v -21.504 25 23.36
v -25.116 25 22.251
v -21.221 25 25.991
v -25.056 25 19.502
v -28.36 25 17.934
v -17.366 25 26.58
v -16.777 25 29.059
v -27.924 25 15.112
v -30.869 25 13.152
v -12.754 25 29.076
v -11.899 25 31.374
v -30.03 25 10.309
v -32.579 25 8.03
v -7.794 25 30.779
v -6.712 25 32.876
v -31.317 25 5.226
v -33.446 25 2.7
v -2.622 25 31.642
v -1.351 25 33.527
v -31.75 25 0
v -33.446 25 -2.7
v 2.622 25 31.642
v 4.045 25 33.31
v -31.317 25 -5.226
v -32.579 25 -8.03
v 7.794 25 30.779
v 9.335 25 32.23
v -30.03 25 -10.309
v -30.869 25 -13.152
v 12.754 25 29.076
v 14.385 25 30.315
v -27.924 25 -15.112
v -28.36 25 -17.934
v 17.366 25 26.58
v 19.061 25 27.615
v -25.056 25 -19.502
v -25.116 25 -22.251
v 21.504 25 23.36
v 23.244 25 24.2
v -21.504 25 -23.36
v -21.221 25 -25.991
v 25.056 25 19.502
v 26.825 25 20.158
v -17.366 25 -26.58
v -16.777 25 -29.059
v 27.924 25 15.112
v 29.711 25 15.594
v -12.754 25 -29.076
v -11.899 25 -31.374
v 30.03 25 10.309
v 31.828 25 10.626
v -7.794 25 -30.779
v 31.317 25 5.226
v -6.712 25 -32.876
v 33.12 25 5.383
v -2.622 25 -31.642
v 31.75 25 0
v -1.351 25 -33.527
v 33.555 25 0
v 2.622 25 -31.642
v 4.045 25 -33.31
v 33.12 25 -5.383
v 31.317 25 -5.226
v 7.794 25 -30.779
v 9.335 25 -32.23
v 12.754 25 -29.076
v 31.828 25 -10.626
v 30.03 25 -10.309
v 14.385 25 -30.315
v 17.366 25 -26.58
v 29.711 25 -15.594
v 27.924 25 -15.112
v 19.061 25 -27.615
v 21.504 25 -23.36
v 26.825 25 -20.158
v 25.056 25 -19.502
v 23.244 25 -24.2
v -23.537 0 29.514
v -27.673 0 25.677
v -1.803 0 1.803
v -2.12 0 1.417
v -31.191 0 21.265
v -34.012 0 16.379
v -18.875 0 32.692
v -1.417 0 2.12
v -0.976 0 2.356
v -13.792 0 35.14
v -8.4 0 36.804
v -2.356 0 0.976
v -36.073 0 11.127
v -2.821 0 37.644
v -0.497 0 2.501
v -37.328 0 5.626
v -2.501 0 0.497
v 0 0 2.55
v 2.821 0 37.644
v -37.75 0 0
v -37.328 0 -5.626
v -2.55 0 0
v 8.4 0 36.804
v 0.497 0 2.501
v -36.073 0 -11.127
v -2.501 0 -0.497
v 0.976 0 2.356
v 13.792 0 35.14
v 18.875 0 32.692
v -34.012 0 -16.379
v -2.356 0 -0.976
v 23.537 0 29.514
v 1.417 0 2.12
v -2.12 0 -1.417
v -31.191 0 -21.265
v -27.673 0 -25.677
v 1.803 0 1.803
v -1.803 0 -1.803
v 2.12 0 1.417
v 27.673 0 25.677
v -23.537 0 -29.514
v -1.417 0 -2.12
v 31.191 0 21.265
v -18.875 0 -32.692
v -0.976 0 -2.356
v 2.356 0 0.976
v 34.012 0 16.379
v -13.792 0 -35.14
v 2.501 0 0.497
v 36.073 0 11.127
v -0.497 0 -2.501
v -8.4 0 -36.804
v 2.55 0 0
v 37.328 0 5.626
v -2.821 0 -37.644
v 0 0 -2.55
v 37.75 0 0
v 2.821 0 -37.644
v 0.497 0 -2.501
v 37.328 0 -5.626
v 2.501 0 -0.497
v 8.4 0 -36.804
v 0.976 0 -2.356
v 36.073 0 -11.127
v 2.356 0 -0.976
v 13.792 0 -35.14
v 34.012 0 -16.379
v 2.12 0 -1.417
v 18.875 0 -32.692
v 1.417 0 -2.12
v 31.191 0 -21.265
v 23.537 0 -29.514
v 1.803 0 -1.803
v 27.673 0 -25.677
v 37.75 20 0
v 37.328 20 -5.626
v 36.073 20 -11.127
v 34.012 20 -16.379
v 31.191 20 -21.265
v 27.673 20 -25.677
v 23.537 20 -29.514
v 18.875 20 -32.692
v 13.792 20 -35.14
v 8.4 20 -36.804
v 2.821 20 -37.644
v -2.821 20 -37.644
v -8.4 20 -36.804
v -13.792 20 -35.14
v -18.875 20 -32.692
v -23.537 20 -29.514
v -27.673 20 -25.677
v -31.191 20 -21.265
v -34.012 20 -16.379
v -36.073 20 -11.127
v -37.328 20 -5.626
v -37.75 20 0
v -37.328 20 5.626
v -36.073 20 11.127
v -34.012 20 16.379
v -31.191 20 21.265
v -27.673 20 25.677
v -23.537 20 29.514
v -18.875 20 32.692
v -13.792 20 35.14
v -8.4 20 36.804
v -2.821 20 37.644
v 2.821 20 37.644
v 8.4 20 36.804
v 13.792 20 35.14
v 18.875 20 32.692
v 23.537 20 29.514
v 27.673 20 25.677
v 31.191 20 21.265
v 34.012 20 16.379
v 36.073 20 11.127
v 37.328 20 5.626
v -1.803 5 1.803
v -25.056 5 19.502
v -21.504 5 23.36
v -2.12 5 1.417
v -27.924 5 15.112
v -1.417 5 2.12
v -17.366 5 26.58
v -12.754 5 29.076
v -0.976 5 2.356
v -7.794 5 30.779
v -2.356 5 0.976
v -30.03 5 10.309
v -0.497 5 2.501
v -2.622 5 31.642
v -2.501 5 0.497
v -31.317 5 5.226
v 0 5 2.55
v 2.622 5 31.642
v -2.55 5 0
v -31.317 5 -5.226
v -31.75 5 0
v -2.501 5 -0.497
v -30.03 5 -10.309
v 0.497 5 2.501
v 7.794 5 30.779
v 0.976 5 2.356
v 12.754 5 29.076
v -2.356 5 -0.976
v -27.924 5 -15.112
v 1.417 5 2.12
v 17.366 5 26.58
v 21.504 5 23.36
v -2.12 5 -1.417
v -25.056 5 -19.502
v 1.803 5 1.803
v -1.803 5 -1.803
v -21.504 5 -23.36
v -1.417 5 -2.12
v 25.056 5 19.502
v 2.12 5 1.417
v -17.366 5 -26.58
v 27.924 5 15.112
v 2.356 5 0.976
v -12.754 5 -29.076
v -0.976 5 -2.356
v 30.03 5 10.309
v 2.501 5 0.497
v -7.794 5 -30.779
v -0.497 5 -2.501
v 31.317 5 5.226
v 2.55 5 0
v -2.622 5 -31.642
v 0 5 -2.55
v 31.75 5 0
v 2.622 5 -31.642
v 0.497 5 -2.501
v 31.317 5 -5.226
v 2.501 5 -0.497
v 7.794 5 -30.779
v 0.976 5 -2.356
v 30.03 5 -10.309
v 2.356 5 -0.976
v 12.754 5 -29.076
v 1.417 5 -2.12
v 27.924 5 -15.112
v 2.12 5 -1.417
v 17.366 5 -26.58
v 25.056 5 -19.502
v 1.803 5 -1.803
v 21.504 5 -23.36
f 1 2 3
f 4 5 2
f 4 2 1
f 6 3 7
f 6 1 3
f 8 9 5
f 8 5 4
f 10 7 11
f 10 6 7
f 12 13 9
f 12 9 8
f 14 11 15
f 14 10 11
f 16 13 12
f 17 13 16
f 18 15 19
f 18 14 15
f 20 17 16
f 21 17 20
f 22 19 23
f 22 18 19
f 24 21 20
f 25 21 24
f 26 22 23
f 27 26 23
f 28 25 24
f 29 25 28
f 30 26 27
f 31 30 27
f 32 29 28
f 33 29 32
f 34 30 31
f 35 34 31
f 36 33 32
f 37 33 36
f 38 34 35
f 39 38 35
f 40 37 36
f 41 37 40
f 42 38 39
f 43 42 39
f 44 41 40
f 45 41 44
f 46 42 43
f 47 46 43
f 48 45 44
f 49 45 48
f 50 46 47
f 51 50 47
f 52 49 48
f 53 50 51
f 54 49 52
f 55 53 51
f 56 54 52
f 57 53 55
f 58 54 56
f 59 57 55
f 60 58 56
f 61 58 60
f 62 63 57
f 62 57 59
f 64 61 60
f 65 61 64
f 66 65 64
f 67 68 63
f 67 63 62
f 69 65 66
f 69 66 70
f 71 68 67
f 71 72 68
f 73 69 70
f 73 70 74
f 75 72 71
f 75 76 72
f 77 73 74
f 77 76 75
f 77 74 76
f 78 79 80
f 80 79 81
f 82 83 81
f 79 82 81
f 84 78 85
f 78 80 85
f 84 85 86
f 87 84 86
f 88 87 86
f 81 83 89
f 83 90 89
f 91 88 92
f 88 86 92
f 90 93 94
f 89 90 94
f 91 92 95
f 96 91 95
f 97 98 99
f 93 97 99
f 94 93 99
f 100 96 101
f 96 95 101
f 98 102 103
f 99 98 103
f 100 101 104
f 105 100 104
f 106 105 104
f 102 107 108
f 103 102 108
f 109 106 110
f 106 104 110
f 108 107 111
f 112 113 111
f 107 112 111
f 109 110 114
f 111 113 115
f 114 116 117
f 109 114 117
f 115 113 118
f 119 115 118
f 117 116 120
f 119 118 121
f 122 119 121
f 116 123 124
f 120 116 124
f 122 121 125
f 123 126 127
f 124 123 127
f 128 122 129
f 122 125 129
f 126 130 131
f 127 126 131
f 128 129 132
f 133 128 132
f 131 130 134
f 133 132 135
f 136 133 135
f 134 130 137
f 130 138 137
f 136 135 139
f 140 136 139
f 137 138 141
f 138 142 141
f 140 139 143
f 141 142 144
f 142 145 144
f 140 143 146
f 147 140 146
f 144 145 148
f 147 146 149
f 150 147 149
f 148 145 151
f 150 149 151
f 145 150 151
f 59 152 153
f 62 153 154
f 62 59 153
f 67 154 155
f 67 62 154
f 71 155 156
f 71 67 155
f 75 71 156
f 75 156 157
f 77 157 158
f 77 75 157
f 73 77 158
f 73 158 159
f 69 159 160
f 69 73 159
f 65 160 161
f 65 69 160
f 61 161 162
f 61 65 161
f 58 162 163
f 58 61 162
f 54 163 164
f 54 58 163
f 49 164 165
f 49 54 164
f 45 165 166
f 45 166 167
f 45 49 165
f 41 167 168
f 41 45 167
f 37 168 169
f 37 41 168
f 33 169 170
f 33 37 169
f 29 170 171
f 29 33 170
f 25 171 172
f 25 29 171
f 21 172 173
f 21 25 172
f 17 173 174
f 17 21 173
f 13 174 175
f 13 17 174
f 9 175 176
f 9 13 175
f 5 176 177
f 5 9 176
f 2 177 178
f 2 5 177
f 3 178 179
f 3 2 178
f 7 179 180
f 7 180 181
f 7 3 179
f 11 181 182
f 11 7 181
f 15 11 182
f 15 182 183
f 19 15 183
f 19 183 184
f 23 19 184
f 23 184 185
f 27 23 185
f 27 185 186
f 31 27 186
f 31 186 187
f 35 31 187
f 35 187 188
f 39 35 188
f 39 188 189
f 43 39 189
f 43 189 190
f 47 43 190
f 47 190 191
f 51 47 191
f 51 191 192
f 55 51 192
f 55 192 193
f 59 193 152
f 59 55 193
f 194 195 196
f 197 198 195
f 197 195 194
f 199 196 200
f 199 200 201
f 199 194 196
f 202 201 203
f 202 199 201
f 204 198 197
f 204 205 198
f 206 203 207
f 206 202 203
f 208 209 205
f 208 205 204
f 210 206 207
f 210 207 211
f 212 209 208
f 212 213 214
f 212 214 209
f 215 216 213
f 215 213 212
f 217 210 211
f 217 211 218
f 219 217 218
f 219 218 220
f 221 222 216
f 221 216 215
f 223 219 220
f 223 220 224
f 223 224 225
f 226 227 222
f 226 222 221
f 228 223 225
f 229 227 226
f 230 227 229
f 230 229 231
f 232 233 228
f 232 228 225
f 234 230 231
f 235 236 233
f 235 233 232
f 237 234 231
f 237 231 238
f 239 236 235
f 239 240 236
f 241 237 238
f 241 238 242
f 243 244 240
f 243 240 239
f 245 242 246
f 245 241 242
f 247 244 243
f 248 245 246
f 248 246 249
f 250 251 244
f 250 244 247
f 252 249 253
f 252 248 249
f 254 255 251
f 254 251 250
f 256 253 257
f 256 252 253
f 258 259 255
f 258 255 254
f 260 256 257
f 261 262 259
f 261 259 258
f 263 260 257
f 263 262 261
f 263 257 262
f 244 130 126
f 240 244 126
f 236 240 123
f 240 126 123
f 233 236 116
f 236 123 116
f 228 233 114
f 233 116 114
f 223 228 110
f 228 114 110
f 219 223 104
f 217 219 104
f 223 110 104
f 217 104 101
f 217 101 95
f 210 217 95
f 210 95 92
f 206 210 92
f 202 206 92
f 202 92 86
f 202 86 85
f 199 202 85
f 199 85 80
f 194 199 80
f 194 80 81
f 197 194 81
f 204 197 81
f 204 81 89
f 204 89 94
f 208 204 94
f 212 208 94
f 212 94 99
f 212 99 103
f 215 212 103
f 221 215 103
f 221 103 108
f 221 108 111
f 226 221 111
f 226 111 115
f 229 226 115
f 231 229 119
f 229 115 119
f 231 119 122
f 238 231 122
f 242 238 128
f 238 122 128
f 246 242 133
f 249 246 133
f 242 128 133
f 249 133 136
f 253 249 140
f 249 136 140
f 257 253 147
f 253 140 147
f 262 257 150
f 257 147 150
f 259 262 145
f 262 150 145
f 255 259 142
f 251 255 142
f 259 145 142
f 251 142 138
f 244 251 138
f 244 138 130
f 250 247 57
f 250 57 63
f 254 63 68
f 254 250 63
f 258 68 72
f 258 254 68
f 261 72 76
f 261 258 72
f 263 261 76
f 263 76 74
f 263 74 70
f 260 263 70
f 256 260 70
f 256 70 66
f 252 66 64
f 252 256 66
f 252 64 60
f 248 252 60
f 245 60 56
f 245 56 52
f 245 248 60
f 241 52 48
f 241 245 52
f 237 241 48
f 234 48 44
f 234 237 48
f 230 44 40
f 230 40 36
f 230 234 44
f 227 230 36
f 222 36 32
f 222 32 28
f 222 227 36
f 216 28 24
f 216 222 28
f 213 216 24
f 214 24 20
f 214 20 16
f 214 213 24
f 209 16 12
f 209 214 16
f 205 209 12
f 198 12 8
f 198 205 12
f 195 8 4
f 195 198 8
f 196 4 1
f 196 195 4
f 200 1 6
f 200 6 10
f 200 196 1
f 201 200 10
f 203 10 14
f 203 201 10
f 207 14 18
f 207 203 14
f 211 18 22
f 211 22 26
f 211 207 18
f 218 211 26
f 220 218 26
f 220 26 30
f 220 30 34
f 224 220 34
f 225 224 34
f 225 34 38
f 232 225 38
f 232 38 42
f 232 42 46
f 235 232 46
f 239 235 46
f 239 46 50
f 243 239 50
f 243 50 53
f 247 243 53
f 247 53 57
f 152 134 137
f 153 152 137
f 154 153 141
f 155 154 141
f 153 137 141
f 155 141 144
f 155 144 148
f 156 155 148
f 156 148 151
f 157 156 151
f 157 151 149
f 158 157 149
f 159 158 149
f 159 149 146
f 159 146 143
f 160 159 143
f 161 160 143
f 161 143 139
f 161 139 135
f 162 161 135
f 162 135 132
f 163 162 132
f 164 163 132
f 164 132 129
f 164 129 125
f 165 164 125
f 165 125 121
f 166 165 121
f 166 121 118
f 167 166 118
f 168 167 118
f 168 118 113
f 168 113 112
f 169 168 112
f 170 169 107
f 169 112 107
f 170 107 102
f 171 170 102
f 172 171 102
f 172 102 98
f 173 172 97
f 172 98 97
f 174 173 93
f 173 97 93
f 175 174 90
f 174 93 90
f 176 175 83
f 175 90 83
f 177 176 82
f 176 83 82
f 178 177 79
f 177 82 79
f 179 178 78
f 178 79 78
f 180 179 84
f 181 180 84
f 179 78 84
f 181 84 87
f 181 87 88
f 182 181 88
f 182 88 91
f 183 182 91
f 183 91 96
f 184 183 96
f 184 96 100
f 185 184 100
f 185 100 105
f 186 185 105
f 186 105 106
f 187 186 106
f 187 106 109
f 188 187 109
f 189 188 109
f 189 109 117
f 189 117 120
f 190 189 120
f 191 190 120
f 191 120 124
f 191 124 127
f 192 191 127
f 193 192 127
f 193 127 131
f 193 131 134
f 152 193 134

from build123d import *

# Parameters (mm, degrees)
SKETCH1_R               = 37.75
BOSS_EXTRUDE1_DEPTH     = 5
SKETCH2_R               = 37.75
SKETCH2_R_2             = 31.7505
BOSS_EXTRUDE2_DEPTH     = 20
CHAMFER1_SIZE           = 5
CHAMFER1_SIZE2          = 4.195498156
SKETCH3_R               = 2.55
CUT_EXTRUDE1_DEPTH      = 1
CUT_EXTRUDE1_DEPTH_BACK = 26


with BuildPart() as part:
    # Sketch1 → Boss-Extrude1 (new body)
    with BuildSketch(Plane(origin=(0, 0, 0), x_dir=(1, 0, 0), z_dir=(0, 1, 0))):
        Circle(SKETCH1_R)
    extrude(amount=BOSS_EXTRUDE1_DEPTH)

    # Sketch2 → Boss-Extrude2 (add)
    with BuildSketch(Plane(origin=(0, 5, 0), x_dir=(1, 0, 0), z_dir=(0, 1, 0))):
        Circle(SKETCH2_R)
        Circle(SKETCH2_R_2, mode=Mode.SUBTRACT)
    extrude(amount=BOSS_EXTRUDE2_DEPTH)

    # Chamfer1
    chamfer1_edges = [part.edges().sort_by_distance(p)[0] for p in [
        (-37.75, 25, 0),
    ]]
    chamfer1_side = [part.faces().sort_by_distance(p)[0] for p in [
        (-37.75, 12.5, 0),
    ]]
    chamfer(chamfer1_edges, length=CHAMFER1_SIZE, length2=CHAMFER1_SIZE2, reference=chamfer1_side[0])

    # Sketch3 → Cut-Extrude1 (cut, two sides)
    with BuildSketch(Plane.XZ) as cut_extrude1_sk:
        Circle(SKETCH3_R)
    extrude(amount=CUT_EXTRUDE1_DEPTH, mode=Mode.SUBTRACT)
    extrude(cut_extrude1_sk.sketch, amount=-CUT_EXTRUDE1_DEPTH_BACK, mode=Mode.SUBTRACT)


solid = part.part
